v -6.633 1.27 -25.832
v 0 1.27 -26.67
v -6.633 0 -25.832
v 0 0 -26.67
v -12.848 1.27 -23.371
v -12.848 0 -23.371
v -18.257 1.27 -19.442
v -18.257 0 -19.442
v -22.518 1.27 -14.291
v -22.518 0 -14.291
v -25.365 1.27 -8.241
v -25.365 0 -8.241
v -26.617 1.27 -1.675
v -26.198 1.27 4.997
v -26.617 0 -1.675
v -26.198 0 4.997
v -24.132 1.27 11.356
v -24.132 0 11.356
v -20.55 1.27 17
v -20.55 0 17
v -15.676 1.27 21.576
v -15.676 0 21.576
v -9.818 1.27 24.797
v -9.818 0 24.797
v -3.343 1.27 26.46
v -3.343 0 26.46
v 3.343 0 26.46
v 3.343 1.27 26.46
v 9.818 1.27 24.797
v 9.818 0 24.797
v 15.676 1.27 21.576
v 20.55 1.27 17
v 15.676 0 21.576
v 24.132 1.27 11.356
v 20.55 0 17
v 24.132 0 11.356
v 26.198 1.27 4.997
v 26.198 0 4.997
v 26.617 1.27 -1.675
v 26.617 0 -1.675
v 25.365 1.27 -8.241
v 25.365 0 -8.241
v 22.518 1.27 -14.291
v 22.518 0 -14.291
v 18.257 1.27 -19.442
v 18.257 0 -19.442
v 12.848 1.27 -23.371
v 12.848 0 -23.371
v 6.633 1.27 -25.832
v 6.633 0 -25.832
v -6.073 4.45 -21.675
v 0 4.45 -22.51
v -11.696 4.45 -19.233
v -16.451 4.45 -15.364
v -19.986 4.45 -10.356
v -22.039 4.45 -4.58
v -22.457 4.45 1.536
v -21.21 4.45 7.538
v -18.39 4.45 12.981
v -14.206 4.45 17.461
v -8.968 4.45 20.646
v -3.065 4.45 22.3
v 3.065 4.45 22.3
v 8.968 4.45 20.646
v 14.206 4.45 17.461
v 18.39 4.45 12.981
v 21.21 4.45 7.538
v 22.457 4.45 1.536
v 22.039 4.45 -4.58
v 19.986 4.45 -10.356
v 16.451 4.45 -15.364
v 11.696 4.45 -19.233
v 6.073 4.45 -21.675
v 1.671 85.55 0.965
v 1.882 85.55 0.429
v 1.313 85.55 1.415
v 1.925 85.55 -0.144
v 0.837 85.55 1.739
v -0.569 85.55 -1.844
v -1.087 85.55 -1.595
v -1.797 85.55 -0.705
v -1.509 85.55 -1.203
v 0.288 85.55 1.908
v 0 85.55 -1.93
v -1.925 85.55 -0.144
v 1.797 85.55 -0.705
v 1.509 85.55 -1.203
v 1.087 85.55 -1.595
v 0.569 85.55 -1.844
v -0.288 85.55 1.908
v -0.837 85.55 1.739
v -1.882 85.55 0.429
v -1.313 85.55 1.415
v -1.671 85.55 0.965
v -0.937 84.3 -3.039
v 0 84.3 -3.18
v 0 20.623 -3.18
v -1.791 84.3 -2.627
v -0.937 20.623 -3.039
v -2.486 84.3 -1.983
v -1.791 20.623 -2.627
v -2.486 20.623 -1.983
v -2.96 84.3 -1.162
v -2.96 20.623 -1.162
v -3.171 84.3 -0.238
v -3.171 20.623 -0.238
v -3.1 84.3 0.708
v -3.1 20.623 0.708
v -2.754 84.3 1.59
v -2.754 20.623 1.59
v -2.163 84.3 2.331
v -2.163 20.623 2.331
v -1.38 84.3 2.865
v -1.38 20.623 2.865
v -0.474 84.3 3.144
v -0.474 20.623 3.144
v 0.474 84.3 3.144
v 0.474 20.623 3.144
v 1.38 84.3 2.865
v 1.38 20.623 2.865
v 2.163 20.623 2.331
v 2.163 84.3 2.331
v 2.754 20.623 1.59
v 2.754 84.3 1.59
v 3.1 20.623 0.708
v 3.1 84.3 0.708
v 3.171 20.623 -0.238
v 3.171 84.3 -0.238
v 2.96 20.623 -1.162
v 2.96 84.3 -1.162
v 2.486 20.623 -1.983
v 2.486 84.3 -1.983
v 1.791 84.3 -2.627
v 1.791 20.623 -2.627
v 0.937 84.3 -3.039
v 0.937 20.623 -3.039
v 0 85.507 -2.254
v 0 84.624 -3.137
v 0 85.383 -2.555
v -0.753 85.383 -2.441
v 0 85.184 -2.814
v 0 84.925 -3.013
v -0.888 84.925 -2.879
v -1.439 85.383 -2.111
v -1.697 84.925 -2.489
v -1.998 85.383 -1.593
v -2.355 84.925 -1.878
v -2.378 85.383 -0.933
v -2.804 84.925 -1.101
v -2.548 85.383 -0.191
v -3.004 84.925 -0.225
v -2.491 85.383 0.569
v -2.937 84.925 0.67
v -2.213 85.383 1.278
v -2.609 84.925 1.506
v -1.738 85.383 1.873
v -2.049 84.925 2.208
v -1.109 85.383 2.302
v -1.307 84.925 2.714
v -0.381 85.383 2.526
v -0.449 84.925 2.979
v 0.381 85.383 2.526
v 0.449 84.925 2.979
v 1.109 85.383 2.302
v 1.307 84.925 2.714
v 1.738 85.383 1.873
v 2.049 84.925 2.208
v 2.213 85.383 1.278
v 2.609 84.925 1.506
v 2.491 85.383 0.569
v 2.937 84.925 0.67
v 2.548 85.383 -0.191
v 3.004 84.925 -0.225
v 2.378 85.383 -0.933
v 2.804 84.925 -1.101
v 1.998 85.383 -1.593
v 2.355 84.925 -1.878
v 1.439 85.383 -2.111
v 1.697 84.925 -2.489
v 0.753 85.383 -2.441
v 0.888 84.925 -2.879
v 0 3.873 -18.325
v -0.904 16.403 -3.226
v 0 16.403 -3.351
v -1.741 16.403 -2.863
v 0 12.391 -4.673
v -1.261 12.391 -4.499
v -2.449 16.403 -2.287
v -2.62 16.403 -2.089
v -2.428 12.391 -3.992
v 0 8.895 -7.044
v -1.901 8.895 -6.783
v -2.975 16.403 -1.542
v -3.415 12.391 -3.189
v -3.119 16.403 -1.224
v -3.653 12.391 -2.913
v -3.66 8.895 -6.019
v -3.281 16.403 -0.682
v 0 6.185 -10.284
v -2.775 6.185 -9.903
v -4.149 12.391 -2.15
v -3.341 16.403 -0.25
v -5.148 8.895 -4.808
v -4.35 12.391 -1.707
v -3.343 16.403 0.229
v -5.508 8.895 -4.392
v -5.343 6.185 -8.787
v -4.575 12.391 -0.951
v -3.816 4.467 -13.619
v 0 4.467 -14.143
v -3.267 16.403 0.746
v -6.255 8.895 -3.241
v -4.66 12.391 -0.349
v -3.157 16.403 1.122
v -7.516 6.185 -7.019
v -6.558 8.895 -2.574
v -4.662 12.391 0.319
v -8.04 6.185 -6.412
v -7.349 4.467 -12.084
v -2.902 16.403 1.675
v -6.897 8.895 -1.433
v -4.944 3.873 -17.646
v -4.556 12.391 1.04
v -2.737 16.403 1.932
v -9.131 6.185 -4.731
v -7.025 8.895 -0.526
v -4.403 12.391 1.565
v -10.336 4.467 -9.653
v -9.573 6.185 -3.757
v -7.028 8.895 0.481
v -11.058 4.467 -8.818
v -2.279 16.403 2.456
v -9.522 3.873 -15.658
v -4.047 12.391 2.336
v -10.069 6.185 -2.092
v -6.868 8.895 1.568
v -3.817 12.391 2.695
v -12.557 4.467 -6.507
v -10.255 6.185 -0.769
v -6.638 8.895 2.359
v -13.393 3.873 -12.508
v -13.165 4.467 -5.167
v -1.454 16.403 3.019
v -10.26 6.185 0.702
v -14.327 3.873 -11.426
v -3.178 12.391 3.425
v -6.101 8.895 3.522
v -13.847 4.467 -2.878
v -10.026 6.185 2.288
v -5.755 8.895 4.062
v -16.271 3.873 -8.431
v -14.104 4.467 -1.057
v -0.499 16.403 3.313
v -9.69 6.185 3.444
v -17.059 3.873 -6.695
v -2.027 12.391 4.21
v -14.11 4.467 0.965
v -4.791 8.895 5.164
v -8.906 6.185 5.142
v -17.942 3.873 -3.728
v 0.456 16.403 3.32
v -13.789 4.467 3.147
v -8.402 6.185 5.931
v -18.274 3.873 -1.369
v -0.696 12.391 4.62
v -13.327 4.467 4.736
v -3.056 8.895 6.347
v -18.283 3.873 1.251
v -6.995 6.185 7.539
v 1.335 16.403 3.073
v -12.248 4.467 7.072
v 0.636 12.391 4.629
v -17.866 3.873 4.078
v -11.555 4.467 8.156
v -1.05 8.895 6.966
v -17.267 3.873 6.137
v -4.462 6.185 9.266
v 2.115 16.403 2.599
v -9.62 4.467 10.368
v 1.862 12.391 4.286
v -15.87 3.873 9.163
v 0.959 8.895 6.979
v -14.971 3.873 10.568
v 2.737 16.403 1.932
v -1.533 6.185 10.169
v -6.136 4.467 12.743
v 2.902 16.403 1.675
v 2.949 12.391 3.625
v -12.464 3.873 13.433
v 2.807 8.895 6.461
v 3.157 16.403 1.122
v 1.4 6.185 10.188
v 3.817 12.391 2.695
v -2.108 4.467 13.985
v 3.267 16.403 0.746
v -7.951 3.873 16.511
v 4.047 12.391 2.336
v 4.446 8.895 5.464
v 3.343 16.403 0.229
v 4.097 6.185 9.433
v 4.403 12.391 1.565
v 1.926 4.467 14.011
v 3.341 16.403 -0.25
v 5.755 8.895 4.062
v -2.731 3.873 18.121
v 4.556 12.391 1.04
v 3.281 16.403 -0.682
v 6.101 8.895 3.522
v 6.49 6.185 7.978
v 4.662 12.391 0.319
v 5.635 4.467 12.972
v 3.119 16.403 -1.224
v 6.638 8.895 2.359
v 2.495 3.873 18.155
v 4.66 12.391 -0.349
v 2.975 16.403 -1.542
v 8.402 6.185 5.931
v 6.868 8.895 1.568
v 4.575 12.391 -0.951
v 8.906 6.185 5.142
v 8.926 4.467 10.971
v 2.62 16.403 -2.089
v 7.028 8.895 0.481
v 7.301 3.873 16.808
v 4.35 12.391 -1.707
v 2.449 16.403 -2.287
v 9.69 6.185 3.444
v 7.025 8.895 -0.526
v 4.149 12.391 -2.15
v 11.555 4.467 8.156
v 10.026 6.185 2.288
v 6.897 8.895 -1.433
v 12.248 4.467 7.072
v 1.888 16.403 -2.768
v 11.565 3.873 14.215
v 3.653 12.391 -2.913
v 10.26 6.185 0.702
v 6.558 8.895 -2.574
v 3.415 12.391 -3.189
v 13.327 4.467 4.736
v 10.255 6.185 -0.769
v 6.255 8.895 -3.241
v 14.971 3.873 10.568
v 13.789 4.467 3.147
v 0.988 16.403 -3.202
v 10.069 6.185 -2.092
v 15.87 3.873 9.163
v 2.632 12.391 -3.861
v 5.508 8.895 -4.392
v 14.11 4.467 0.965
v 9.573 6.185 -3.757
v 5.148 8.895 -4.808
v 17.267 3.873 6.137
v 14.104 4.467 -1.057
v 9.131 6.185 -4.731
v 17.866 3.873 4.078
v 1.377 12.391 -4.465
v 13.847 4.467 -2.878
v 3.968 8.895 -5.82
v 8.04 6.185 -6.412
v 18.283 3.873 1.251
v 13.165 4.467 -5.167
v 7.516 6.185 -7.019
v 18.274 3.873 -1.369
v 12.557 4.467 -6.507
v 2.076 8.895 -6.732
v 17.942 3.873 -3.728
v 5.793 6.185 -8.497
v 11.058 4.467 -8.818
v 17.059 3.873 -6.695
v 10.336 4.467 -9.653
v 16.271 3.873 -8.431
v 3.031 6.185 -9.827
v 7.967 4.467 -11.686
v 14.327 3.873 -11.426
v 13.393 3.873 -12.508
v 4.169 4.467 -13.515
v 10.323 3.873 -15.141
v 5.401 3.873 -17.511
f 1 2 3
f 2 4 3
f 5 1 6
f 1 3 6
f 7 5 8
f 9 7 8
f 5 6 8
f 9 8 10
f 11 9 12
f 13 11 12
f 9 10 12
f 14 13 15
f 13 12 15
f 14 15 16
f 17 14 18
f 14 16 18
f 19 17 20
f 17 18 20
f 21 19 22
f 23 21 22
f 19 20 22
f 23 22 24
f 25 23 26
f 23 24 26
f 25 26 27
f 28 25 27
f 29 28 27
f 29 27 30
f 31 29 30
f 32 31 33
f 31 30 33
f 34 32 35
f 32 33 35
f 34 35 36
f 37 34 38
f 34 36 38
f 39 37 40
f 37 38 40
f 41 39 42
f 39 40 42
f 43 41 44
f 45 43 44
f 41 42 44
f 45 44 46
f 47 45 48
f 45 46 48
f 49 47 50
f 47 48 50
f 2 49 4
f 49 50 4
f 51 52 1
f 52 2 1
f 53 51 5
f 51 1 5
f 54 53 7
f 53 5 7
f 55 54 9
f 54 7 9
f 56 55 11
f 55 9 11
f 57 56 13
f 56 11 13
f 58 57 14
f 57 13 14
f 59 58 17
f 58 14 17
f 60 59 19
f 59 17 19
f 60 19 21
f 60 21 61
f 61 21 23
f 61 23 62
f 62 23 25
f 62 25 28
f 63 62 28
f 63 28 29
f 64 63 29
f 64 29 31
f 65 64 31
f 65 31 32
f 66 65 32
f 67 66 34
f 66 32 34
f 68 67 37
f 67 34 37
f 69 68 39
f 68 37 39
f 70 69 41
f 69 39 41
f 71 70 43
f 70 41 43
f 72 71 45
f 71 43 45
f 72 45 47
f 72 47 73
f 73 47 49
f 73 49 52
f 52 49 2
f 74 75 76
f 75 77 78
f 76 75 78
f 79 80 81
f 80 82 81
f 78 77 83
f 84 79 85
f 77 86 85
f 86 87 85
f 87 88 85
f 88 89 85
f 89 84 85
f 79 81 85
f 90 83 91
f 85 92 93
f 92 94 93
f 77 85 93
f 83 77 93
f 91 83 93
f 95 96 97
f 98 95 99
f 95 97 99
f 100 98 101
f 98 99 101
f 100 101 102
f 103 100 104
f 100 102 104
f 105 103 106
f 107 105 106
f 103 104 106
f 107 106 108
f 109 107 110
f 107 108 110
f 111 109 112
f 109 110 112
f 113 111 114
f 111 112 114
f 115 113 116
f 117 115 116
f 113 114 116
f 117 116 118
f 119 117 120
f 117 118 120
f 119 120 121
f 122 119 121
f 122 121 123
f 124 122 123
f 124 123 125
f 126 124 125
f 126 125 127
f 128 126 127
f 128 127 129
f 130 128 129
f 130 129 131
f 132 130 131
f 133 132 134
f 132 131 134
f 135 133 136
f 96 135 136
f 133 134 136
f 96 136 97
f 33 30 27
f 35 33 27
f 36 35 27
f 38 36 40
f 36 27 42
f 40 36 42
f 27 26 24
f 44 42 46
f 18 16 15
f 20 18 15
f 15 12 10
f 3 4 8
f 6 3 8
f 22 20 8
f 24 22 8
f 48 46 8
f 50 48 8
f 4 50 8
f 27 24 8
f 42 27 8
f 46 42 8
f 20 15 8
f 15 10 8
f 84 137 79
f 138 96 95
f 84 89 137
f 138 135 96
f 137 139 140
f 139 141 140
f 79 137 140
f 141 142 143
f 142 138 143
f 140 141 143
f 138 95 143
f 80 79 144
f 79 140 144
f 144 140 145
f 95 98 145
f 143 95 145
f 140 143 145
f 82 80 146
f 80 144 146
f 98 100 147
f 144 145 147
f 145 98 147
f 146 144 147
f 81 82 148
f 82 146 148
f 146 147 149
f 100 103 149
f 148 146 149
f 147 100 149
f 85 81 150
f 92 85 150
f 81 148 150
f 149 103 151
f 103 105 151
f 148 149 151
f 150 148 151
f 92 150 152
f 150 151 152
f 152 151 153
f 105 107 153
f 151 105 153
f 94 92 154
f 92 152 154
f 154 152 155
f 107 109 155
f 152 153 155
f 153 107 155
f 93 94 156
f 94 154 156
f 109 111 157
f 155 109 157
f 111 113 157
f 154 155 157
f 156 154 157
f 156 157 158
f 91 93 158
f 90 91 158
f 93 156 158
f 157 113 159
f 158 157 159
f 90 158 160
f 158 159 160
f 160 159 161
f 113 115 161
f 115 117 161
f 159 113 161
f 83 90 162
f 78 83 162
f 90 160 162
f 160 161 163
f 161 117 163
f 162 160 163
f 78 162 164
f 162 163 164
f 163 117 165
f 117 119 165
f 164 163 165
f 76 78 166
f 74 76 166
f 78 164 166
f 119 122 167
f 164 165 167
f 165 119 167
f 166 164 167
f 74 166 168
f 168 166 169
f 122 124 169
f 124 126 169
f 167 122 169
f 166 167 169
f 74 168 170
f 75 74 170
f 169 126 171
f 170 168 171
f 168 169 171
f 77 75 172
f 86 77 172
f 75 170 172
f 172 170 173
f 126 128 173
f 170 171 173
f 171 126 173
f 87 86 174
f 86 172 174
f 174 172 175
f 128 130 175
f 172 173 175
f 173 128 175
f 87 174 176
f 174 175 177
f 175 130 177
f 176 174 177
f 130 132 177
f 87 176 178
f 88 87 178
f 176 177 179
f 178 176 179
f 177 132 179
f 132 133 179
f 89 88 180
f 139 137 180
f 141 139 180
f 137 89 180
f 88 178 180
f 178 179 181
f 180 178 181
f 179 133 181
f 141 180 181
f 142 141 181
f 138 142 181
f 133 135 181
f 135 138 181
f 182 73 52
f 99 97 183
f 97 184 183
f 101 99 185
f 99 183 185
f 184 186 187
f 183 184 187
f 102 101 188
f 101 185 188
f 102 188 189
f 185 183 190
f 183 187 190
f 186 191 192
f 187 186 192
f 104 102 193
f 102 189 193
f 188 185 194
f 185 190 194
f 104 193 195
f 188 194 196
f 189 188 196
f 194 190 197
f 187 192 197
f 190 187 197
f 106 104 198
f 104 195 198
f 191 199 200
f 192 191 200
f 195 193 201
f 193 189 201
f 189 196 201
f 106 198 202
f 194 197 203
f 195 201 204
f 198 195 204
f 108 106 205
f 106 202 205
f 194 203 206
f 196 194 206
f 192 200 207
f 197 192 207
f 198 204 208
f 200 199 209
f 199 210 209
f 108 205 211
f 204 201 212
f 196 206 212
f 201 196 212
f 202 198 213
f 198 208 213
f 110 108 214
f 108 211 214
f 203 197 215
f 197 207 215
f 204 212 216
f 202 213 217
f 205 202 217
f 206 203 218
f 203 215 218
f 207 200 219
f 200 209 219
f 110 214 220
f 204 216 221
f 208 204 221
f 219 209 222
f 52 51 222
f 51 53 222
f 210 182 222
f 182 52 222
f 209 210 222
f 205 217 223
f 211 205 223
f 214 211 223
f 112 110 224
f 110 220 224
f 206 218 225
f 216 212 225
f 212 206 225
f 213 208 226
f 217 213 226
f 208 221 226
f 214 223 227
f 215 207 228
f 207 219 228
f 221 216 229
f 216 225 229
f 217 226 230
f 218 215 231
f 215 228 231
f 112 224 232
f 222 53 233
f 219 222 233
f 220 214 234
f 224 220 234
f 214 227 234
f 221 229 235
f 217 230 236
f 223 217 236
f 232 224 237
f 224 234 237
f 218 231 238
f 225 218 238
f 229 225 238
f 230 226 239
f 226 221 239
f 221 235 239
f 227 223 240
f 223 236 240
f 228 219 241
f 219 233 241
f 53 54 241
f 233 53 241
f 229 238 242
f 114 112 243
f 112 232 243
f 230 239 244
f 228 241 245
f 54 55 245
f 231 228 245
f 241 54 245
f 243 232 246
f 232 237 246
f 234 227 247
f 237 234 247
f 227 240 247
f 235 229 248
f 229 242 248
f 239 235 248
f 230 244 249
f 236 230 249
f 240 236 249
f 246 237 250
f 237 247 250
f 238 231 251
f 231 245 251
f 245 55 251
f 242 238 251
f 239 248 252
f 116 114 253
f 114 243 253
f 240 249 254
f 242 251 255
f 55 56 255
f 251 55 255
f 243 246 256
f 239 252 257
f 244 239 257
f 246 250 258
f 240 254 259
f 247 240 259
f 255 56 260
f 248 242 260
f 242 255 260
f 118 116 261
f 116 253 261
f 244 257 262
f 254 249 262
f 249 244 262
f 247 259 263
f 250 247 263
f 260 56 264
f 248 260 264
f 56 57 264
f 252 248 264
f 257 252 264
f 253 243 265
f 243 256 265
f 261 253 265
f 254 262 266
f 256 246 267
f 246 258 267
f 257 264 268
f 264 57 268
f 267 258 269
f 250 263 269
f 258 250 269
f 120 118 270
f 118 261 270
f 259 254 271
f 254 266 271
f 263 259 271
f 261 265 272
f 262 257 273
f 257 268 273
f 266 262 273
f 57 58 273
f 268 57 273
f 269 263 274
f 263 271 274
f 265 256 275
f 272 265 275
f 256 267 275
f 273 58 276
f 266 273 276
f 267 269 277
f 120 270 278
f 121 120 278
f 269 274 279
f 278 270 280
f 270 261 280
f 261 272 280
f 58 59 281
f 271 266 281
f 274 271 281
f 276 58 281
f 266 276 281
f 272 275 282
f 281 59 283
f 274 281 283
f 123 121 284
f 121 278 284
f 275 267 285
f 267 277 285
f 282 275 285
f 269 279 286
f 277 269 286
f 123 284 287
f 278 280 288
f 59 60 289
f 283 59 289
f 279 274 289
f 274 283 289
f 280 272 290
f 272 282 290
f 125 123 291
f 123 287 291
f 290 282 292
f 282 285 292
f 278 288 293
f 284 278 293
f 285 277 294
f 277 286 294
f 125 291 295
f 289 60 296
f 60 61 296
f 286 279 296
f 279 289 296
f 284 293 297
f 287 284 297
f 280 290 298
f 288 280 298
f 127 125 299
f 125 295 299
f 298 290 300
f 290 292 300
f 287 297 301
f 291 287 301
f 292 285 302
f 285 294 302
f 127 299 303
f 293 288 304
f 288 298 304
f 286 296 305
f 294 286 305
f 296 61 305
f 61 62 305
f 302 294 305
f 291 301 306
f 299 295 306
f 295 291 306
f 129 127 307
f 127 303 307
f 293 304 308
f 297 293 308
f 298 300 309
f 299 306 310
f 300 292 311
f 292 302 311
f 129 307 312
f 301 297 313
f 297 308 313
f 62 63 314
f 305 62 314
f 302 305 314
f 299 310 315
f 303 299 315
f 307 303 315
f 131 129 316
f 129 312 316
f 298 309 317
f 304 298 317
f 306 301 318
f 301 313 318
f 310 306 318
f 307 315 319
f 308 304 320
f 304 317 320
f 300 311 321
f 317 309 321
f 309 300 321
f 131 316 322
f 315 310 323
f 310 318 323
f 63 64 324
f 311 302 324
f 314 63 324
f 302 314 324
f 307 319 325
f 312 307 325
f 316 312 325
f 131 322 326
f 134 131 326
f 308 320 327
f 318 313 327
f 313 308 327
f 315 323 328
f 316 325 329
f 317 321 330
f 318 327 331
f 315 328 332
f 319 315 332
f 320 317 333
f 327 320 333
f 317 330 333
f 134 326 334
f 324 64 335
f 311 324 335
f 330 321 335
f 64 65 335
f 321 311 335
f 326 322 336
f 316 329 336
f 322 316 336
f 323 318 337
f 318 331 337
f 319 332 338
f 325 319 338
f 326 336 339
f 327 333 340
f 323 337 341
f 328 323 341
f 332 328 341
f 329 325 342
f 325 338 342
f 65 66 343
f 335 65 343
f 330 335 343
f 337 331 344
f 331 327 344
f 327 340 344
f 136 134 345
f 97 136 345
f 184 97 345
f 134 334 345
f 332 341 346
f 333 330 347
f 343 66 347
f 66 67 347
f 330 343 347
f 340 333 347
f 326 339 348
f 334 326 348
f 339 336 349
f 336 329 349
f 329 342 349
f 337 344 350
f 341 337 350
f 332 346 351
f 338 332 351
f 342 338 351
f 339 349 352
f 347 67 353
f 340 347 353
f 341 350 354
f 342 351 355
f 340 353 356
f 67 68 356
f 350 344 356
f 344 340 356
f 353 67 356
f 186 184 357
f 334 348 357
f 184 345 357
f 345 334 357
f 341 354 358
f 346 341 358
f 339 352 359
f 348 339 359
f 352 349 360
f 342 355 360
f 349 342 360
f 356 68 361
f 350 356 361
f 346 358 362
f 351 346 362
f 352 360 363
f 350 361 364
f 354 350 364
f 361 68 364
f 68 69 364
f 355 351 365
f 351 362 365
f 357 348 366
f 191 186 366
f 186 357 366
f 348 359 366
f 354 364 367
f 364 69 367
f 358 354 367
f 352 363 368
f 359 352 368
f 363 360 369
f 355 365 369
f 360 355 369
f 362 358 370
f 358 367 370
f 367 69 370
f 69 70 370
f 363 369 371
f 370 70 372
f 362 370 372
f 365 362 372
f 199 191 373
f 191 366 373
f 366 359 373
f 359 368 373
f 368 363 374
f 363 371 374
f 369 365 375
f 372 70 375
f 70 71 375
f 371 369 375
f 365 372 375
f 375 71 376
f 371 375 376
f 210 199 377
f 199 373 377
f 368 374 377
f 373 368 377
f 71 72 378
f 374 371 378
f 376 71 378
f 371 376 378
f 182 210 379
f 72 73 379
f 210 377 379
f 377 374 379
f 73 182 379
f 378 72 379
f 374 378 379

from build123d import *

# Parameters (mm, degrees)
FILLET1_R = 1.25


with BuildPart() as part:
    # Sketch1 → Revolve1 (revolve)
    with BuildSketch(Plane(origin=(0, 0, 0), x_dir=(0, 0, -1), z_dir=(1, 0, 0))):
        with BuildLine():
            Line((0, 0), (0, 85.55))
            Line((0, 85.55), (3.18, 85.55))
            Line((3.18, 85.55), (3.18, 20.623345081))
            ThreePointArc((3.18, 20.623345081), (8.570011584, 7.427407082), (22.50988431, 4.45))
            Line((22.50988431, 4.45), (26.67, 1.27))
            Line((26.67, 1.27), (26.67, 0))
            Line((26.67, 0), (0, 0))
        make_face()
    revolve(axis=Axis((0, 0, 0), (0, 1, 0)))

    # Fillet1
    fillet1_edges = [part.edges().sort_by_distance(p)[0] for p in [
        (0, 85.55, 3.18),
    ]]
    fillet(fillet1_edges, radius=FILLET1_R)


solid = part.part
